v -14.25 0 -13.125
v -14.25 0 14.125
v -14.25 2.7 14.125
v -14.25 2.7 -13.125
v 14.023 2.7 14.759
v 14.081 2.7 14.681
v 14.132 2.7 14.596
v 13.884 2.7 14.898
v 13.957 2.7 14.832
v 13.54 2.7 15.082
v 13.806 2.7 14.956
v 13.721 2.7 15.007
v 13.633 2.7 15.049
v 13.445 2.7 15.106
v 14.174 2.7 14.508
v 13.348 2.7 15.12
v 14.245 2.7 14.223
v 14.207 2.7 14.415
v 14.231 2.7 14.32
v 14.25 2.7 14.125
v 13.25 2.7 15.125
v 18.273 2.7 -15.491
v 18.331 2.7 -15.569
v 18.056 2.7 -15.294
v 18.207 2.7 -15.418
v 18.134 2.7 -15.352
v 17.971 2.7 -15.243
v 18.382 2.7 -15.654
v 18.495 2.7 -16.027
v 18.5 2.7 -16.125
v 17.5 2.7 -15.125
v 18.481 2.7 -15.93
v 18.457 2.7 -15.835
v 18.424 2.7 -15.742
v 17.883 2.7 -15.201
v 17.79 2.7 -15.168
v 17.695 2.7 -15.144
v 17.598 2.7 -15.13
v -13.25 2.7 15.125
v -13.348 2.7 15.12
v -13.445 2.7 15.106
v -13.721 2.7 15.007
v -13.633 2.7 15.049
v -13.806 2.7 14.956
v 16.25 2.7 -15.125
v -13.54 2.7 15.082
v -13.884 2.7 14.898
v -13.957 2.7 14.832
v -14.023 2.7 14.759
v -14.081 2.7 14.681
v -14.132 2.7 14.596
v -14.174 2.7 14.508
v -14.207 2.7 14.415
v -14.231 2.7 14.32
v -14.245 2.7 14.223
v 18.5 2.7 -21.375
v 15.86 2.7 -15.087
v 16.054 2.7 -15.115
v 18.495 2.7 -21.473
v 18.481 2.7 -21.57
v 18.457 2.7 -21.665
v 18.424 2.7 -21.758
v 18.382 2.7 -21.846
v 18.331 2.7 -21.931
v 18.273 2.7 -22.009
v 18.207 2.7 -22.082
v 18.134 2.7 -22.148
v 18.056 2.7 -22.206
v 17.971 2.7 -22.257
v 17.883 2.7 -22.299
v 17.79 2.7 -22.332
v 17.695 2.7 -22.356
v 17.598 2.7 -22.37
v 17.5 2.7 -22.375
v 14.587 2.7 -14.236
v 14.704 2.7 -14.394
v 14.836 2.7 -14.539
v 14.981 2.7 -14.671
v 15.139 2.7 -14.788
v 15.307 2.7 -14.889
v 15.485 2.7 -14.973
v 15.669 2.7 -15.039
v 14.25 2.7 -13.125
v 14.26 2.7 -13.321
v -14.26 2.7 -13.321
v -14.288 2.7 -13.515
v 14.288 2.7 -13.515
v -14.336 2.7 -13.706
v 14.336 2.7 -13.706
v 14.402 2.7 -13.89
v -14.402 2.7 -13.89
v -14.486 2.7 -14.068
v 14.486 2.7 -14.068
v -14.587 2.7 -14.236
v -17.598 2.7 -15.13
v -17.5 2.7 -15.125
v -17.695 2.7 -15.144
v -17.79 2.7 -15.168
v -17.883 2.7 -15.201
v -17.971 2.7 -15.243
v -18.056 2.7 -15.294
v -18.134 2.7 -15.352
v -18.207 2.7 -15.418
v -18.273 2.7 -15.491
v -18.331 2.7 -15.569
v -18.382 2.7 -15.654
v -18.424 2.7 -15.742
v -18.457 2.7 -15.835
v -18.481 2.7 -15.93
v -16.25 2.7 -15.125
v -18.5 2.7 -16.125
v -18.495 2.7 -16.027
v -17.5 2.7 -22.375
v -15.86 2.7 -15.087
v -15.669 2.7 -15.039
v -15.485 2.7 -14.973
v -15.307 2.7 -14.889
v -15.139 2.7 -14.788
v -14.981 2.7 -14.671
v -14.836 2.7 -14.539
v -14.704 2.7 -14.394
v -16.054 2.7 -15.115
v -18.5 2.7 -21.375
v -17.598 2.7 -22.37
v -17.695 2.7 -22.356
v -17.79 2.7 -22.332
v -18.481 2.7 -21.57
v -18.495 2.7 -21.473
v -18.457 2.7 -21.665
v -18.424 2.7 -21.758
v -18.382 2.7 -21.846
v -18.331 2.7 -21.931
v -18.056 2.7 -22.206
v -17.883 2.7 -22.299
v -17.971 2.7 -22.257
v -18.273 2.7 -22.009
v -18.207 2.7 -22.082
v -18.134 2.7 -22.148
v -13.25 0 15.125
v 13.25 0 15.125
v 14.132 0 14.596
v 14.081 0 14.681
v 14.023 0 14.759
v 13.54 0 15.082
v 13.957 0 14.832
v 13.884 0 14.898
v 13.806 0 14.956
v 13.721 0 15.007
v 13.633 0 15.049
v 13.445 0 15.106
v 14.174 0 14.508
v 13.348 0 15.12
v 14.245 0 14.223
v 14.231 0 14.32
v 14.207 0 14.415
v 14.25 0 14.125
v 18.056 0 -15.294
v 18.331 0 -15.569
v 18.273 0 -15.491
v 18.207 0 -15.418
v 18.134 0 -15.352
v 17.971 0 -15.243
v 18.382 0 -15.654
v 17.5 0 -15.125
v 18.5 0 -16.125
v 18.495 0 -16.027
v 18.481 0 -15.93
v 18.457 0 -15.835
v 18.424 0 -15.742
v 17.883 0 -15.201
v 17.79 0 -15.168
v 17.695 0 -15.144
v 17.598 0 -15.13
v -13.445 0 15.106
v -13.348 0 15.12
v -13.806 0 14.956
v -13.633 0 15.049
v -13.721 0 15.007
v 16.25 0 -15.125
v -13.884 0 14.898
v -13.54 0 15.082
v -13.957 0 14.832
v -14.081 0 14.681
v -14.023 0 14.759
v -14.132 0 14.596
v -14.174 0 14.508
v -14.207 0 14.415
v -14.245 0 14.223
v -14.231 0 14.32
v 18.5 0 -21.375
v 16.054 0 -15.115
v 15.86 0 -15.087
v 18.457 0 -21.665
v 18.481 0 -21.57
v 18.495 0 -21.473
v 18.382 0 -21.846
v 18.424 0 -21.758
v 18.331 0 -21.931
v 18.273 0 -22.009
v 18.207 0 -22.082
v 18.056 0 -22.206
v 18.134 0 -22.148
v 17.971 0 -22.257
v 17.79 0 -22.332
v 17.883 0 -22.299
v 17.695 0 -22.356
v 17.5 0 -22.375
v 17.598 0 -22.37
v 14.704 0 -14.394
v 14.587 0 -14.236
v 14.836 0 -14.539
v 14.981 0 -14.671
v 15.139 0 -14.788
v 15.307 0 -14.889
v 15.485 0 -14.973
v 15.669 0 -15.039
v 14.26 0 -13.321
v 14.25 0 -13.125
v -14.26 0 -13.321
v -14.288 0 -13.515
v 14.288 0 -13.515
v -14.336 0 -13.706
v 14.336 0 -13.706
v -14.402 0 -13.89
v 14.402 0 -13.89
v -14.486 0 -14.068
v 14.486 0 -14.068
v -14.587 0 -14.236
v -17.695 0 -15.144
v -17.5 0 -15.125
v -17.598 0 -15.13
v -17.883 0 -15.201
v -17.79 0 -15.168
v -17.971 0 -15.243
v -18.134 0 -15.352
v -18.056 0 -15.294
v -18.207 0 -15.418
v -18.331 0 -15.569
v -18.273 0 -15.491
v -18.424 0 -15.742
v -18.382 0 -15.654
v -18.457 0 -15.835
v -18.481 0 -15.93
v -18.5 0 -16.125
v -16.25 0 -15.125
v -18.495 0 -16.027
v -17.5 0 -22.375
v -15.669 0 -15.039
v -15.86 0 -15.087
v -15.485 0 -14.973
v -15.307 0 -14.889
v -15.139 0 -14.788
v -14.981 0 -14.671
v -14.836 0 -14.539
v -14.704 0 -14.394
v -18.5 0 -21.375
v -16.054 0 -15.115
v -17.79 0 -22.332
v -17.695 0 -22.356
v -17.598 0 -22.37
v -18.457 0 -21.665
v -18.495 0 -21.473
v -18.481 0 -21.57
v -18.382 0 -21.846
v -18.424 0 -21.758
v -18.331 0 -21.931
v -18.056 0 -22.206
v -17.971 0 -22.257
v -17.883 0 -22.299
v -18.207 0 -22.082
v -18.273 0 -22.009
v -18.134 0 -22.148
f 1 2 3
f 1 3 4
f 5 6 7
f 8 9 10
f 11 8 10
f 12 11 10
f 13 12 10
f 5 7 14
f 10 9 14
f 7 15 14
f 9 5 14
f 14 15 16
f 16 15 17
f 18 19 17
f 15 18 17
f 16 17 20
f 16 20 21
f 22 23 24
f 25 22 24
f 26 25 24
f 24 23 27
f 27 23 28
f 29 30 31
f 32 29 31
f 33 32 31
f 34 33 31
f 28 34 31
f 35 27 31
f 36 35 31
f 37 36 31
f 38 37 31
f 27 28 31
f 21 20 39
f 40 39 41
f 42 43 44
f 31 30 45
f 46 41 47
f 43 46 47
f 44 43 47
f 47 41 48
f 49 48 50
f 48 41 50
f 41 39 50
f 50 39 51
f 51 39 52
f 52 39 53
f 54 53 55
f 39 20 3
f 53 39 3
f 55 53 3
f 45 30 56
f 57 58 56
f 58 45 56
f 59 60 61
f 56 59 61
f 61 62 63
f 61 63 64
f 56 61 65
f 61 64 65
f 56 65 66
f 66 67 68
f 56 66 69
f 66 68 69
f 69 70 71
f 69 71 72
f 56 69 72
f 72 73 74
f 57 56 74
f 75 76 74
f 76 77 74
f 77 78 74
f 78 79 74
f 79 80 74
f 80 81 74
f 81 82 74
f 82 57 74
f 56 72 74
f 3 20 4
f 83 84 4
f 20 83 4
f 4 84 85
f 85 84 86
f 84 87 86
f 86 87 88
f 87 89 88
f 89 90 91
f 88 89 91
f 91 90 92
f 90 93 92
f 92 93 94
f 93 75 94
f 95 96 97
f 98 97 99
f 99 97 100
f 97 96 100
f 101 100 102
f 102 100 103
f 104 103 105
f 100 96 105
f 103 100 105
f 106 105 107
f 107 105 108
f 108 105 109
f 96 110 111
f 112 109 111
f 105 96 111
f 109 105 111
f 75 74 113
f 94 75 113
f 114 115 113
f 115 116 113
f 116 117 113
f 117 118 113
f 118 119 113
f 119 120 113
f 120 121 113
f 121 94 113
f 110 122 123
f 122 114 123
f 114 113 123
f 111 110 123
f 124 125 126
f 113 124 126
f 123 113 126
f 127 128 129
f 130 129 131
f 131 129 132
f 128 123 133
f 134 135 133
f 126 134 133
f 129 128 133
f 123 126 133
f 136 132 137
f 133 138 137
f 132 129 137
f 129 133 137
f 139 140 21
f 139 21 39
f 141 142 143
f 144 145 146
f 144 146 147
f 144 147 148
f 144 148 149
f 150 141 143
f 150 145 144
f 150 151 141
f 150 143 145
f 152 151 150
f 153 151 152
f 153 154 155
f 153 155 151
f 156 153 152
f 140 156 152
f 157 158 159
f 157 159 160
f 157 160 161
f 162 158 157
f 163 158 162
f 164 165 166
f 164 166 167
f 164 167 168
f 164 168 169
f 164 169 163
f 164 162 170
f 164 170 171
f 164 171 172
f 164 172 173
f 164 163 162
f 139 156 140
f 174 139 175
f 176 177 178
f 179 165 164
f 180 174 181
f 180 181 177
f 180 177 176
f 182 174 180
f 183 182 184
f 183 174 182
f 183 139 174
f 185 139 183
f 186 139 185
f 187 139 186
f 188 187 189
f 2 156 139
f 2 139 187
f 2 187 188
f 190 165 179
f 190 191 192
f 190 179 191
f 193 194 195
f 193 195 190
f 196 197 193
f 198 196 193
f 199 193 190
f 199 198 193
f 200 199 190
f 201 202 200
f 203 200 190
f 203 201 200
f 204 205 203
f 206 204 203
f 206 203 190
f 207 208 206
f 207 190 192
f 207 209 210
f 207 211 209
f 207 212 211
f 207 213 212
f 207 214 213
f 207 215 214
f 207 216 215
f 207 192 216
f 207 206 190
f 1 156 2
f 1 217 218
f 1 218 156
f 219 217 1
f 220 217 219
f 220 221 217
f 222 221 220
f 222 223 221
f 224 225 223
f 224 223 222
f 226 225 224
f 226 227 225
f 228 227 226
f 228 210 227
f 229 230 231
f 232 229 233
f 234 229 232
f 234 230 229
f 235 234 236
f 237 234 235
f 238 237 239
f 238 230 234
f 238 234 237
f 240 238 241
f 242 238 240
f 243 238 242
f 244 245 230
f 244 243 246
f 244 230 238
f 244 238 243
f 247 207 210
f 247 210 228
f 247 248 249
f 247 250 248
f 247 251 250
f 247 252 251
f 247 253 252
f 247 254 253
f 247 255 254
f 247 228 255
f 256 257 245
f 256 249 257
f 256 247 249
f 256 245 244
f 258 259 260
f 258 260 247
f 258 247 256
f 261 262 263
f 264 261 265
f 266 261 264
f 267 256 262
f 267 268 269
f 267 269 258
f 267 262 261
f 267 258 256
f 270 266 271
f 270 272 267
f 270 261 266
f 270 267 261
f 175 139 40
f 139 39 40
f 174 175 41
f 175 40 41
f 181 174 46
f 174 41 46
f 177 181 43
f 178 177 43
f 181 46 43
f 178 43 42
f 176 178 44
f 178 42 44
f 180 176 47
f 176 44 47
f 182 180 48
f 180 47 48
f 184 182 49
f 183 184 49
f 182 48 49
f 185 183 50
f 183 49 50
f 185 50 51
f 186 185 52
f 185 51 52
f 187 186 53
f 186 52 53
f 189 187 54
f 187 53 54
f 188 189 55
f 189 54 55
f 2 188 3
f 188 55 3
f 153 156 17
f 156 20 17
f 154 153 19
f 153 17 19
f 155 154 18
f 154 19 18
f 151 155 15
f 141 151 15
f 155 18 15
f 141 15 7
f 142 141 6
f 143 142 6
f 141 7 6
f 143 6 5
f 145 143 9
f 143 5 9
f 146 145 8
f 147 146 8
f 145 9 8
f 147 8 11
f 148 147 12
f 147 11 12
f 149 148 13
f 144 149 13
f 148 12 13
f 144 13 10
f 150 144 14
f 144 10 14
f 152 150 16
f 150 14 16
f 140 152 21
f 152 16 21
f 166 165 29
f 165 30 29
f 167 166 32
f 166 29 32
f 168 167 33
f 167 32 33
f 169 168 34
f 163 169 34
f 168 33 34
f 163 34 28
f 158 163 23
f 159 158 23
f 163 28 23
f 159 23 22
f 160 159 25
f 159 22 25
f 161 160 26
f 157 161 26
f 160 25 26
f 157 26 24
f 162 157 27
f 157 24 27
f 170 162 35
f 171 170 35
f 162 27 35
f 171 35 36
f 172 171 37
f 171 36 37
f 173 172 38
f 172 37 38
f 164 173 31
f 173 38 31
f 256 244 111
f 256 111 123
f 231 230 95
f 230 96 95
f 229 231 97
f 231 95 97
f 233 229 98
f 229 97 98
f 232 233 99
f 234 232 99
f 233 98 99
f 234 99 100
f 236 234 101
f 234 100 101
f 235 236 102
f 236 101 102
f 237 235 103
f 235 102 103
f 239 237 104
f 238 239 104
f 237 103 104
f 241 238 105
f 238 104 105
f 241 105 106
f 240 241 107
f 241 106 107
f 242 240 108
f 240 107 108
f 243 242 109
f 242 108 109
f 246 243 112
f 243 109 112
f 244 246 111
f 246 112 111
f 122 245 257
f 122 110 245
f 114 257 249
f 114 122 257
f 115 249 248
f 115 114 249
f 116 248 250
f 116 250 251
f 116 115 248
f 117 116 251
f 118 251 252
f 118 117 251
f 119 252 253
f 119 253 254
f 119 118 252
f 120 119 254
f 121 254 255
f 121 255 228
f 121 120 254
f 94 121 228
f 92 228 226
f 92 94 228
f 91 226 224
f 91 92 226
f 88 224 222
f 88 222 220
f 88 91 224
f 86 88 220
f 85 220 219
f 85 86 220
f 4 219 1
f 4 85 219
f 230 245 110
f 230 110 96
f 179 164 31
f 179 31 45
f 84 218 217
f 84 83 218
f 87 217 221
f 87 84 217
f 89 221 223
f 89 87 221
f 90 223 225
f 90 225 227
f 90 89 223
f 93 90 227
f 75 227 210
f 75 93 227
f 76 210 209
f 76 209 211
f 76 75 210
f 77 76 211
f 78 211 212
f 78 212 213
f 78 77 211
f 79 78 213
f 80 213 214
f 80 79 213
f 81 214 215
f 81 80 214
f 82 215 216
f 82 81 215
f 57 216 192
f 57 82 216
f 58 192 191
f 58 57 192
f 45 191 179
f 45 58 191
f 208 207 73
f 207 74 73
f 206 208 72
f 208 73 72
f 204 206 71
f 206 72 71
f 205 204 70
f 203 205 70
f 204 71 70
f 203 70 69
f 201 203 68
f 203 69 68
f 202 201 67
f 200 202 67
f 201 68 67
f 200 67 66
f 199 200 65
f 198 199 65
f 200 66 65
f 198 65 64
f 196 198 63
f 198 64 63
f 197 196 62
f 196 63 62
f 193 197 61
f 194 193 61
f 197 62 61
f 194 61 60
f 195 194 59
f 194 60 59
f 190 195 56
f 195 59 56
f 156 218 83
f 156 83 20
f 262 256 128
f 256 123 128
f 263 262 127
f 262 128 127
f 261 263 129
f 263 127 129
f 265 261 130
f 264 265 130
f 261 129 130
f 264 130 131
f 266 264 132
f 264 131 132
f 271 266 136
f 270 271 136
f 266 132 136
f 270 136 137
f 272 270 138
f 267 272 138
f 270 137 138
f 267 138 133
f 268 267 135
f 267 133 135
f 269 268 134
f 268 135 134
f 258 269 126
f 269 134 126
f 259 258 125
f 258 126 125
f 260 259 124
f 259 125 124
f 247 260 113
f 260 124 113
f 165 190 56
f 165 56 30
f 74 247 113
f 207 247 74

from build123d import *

# Parameters (mm, degrees)
BOSS_EXTRUDE1_DEPTH = 2.7
FILLET6_R           = 1
FILLET7_R           = 2


with BuildPart() as part:
    # Sketch1 → Boss-Extrude1 (new body)
    with BuildSketch(Plane(origin=(0, 0, 0), x_dir=(1, 0, 0), z_dir=(0, 1, 0))):
        Polygon((-14.25, 15.125), (-18.5, 15.125), (-18.5, 22.375), (18.5, 22.375), (18.5, 15.125), (14.25, 15.125), (14.25, -15.125), (-14.25, -15.125), align=None)
    extrude(amount=BOSS_EXTRUDE1_DEPTH)

    # Fillet6
    fillet6_edges = [part.edges().sort_by_distance(p)[0] for p in [
        (14.25, 1.35, 15.125),
        (-14.25, 1.35, 15.125),
        (-18.5, 1.35, -15.125),
        (-18.5, 1.35, -22.375),
        (18.5, 1.35, -22.375),
        (18.5, 1.35, -15.125),
    ]]
    fillet(fillet6_edges, radius=FILLET6_R)

    # Fillet7
    fillet7_edges = [part.edges().sort_by_distance(p)[0] for p in [
        (14.25, 1.35, -15.125),
        (-14.25, 1.35, -15.125),
    ]]
    fillet(fillet7_edges, radius=FILLET7_R)


solid = part.part
